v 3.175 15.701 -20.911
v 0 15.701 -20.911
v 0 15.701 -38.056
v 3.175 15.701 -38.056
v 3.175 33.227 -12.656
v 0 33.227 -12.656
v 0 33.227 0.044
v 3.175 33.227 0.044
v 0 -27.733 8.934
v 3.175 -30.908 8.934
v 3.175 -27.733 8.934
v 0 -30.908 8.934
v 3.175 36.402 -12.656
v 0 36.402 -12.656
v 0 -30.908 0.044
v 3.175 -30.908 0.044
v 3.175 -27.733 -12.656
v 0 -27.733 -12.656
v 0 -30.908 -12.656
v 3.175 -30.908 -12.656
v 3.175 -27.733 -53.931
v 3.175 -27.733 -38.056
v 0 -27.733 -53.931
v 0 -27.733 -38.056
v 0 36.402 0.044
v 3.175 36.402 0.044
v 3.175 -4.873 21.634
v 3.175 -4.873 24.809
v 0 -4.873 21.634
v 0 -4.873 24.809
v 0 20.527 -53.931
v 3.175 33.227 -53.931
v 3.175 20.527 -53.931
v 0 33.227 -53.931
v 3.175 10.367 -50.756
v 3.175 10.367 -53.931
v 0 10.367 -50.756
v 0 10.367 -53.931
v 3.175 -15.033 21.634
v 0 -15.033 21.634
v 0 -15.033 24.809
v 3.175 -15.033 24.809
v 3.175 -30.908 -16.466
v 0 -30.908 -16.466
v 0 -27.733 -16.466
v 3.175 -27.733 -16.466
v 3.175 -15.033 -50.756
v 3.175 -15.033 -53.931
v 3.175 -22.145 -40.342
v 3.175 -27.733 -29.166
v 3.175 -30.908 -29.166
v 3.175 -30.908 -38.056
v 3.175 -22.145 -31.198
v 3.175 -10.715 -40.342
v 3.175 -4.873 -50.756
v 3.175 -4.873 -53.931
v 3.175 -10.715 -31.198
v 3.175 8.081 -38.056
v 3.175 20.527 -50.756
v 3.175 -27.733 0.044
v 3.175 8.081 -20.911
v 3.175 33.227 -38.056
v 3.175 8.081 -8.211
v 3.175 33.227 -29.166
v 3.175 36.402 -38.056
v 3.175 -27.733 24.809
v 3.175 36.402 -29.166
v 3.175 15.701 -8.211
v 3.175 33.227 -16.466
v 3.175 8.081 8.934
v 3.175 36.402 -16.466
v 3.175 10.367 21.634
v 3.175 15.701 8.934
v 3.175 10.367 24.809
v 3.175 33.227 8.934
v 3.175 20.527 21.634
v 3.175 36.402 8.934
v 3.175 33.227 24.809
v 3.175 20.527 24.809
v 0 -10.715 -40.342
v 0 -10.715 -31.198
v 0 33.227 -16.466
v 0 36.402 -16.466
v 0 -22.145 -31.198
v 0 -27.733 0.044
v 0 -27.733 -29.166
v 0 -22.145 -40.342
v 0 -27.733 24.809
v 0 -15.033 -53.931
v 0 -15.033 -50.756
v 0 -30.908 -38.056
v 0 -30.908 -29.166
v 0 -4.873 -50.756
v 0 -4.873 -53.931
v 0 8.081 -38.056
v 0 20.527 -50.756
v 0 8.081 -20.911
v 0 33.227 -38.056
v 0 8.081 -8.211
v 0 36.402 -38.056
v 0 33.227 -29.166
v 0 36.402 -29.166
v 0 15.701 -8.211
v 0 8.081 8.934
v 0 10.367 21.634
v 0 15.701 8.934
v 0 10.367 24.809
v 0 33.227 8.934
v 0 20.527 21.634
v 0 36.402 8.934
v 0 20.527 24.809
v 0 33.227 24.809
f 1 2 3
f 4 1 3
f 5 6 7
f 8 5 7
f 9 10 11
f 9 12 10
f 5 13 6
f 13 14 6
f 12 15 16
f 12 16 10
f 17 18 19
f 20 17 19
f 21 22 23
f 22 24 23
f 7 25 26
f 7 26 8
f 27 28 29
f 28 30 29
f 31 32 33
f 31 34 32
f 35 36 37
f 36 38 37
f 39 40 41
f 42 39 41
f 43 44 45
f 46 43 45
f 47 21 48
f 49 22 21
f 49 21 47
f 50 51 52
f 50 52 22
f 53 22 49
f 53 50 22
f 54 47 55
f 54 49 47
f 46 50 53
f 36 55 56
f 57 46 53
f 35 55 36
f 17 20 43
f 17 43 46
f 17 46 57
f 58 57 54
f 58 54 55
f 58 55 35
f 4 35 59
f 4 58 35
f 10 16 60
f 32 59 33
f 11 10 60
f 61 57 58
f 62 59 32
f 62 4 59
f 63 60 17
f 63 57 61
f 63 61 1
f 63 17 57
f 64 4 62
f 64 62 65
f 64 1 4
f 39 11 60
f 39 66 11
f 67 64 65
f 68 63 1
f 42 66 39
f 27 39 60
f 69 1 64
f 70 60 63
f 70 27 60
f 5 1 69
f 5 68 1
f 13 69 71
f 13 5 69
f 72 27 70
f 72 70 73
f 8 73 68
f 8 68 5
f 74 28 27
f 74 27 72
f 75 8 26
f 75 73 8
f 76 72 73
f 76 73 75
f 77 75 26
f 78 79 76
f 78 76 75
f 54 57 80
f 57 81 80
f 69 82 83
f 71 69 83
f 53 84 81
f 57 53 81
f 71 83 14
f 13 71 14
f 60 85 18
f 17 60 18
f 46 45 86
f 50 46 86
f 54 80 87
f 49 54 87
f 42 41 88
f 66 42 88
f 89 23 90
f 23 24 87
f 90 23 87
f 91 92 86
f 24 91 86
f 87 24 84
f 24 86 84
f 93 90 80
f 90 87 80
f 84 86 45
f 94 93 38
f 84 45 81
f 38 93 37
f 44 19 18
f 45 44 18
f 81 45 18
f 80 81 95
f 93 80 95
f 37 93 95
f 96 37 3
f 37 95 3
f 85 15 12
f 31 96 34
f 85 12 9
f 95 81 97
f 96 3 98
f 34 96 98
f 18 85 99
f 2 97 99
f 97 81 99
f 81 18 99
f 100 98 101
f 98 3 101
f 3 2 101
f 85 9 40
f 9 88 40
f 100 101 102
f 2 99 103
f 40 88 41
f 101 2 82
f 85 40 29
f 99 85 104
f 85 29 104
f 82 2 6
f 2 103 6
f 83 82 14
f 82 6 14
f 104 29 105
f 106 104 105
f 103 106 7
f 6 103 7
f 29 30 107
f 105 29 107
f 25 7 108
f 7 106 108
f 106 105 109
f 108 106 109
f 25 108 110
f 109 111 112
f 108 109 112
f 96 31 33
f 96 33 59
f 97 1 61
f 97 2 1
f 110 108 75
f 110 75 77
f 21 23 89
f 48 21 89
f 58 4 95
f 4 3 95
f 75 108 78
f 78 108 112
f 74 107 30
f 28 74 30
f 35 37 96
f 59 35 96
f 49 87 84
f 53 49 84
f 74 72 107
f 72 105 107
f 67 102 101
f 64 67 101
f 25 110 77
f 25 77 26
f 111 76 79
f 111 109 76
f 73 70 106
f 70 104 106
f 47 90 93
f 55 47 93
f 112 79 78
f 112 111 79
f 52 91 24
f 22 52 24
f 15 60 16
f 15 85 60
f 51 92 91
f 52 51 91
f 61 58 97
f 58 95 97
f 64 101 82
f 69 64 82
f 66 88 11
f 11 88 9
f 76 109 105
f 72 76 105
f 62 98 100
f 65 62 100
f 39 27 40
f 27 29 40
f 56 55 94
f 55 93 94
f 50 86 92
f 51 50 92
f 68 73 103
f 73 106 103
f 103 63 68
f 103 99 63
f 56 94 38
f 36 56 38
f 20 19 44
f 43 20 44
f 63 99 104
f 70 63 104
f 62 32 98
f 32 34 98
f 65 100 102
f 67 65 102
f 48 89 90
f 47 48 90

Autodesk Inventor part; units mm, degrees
ref_plane "YZ Plane" through (0, 0, 0) normal (1, 0, 0) x (0, 1, 0)
ref_plane "XZ Plane" through (0, 0, 0) normal (0, 1, 0) x (-1, 0, 0)
ref_plane "XY Plane" through (0, 0, 0) normal (0, 0, 1) x (1, 0, 0)
sketch "Sketch1" plane through (0, 0, 0) normal (1, 0, 0) x (0, 1, 0)
  line L0 (33.2271, 21.6336) -> (-27.7329, 21.6336)
  line L1 (-27.7329, 21.6336) -> (-27.7329, -50.7564)
  line L2 (-27.7329, -50.7564) -> (33.2271, -50.7564)
  line L3 (33.2271, -50.7564) -> (33.2271, 21.6336)
  line L4 (33.2271, -38.0564) -> (36.4021, -38.0564)
  line L5 (36.4021, -38.0564) -> (36.4021, -29.1664)
  line L6 (36.4021, -29.1664) -> (33.2271, -29.1664)
  line L7 (33.2271, -29.1664) -> (33.2271, -38.0564)
  line L8 (33.2271, 8.9336) -> (36.4021, 8.9336)
  line L9 (36.4021, 8.9336) -> (36.4021, 0.0436)
  line L10 (36.4021, 0.0436) -> (33.2271, 0.0436)
  line L11 (33.2271, 0.0436) -> (33.2271, 8.9336)
  line L12 (33.2271, -16.4664) -> (36.4021, -16.4664)
  line L13 (36.4021, -16.4664) -> (36.4021, -12.6564)
  line L14 (36.4021, -12.6564) -> (33.2271, -12.6564)
  line L15 (33.2271, -12.6564) -> (33.2271, -16.4664)
  line L16 (33.2271, 21.6336) -> (20.5271, 21.6336)
  line L17 (20.5271, 21.6336) -> (20.5271, 24.8086)
  line L18 (20.5271, 24.8086) -> (33.2271, 24.8086)
  line L19 (33.2271, 24.8086) -> (33.2271, 21.6336)
  line L20 (-27.7329, 21.6336) -> (-15.0329, 21.6336)
  line L21 (-15.0329, 21.6336) -> (-15.0329, 24.8086)
  line L22 (-15.0329, 24.8086) -> (-27.7329, 24.8086)
  line L23 (-27.7329, 24.8086) -> (-27.7329, 21.6336)
  line L24 (-4.8729, 21.6336) -> (10.3671, 21.6336)
  line L25 (10.3671, 21.6336) -> (10.3671, 24.8086)
  line L26 (10.3671, 24.8086) -> (-4.8729, 24.8086)
  line L27 (-4.8729, 24.8086) -> (-4.8729, 21.6336)
  point P0 (0, 0)
  dimension "d0" = 60.96
  dimension "d1" = 72.39
  dimension "d2" = 12.7
  dimension "d3" = 8.89
  dimension "d4" = 3.175
  dimension "d5" = 8.89
  dimension "d6" = 12.7
  dimension "d7" = 12.7
  dimension "d8" = 12.7
  dimension "d11" = 3.175
  dimension "d12" = 12.7
  dimension "d13" = 12.7
  dimension "d14" = 10.16
  dimension "d15" = 10.16
ref_plane "Work Plane1" through (0, 2.7471, 0.0436) normal (0, 1, 0) x (1, 0, 0)
extrude "Extrusion3" add sketch "Sketch1" along normal blind 3.175
ref_plane "Work Plane2" through (0, -15.0329, -14.5614) normal (0, 0, 1) x (1, 0, 0)
mirror "Mirror2" about plane through (0, -15.0329, -14.5614) normal (0, 0, 1) of "Extrusion3"
mirror "Mirror3" about plane through (0, 2.7471, 0.0436) normal (0, 1, 0) of "Extrusion3"
sketch "Sketch2" plane through (0, 0, 0) normal (-1, 0, 0) x (0, 0, 1)
  line L0 (-40.3424, -22.1449) -> (-31.1984, -22.1449)
  line L1 (-31.1984, -22.1449) -> (-31.1984, -10.7149)
  line L2 (-31.1984, -10.7149) -> (-40.3424, -10.7149)
  line L3 (-40.3424, -10.7149) -> (-40.3424, -22.1449)
  line L4 (-38.0564, -30.9079) -> (-29.1664, -30.9079) projected
  line L5 (-50.7564, -15.0329) -> (-50.7564, -4.8729) projected
  point P0 (0, 0)
  dimension "d20" = 20.193
  dimension "d21" = 11.43
  dimension "d22" = 9.144
  dimension "d23" = 10.414
extrude "Extrusion4" cut sketch "Sketch2" against normal blind 3.175
sketch "Sketch3" plane through (0, 0, 0) normal (-1, 0, 0) x (0, 0, 1)
  line L0 (-38.0564, 8.0811) -> (8.9336, 8.0811)
  line L1 (8.9336, 8.0811) -> (8.9336, 15.7011)
  line L2 (8.9336, 15.7011) -> (-38.0564, 15.7011)
  line L3 (-38.0564, 15.7011) -> (-38.0564, 8.0811)
  line L4 (-16.4664, -27.7329) -> (-29.1664, -27.7329) projected
  line L5 (-50.7564, 10.3671) -> (-50.7564, 20.5271) projected
  line L6 (21.6336, 20.5271) -> (21.6336, 10.3671) projected
  line L7 (-20.9114, 8.0811) -> (-8.2114, 8.0811)
  line L8 (-8.2114, 8.0811) -> (-8.2114, 15.7011)
  line L9 (-8.2114, 15.7011) -> (-20.9114, 15.7011)
  line L10 (-20.9114, 15.7011) -> (-20.9114, 8.0811)
  point P0 (0, 0)
  dimension "d26" = 43.434
  dimension "d27" = 7.62
  dimension "d28" = 12.7
  dimension "d29" = 12.7
  dimension "d30" = 12.7
  dimension "d31" = 46.99
  dimension "d32" = 17.145
  dimension "d33" = 17.145
extrude "Extrusion5" cut sketch "Sketch3" against normal blind 3.175 contours L3 L2 L10 L0 | L8 L2 L1 L0
